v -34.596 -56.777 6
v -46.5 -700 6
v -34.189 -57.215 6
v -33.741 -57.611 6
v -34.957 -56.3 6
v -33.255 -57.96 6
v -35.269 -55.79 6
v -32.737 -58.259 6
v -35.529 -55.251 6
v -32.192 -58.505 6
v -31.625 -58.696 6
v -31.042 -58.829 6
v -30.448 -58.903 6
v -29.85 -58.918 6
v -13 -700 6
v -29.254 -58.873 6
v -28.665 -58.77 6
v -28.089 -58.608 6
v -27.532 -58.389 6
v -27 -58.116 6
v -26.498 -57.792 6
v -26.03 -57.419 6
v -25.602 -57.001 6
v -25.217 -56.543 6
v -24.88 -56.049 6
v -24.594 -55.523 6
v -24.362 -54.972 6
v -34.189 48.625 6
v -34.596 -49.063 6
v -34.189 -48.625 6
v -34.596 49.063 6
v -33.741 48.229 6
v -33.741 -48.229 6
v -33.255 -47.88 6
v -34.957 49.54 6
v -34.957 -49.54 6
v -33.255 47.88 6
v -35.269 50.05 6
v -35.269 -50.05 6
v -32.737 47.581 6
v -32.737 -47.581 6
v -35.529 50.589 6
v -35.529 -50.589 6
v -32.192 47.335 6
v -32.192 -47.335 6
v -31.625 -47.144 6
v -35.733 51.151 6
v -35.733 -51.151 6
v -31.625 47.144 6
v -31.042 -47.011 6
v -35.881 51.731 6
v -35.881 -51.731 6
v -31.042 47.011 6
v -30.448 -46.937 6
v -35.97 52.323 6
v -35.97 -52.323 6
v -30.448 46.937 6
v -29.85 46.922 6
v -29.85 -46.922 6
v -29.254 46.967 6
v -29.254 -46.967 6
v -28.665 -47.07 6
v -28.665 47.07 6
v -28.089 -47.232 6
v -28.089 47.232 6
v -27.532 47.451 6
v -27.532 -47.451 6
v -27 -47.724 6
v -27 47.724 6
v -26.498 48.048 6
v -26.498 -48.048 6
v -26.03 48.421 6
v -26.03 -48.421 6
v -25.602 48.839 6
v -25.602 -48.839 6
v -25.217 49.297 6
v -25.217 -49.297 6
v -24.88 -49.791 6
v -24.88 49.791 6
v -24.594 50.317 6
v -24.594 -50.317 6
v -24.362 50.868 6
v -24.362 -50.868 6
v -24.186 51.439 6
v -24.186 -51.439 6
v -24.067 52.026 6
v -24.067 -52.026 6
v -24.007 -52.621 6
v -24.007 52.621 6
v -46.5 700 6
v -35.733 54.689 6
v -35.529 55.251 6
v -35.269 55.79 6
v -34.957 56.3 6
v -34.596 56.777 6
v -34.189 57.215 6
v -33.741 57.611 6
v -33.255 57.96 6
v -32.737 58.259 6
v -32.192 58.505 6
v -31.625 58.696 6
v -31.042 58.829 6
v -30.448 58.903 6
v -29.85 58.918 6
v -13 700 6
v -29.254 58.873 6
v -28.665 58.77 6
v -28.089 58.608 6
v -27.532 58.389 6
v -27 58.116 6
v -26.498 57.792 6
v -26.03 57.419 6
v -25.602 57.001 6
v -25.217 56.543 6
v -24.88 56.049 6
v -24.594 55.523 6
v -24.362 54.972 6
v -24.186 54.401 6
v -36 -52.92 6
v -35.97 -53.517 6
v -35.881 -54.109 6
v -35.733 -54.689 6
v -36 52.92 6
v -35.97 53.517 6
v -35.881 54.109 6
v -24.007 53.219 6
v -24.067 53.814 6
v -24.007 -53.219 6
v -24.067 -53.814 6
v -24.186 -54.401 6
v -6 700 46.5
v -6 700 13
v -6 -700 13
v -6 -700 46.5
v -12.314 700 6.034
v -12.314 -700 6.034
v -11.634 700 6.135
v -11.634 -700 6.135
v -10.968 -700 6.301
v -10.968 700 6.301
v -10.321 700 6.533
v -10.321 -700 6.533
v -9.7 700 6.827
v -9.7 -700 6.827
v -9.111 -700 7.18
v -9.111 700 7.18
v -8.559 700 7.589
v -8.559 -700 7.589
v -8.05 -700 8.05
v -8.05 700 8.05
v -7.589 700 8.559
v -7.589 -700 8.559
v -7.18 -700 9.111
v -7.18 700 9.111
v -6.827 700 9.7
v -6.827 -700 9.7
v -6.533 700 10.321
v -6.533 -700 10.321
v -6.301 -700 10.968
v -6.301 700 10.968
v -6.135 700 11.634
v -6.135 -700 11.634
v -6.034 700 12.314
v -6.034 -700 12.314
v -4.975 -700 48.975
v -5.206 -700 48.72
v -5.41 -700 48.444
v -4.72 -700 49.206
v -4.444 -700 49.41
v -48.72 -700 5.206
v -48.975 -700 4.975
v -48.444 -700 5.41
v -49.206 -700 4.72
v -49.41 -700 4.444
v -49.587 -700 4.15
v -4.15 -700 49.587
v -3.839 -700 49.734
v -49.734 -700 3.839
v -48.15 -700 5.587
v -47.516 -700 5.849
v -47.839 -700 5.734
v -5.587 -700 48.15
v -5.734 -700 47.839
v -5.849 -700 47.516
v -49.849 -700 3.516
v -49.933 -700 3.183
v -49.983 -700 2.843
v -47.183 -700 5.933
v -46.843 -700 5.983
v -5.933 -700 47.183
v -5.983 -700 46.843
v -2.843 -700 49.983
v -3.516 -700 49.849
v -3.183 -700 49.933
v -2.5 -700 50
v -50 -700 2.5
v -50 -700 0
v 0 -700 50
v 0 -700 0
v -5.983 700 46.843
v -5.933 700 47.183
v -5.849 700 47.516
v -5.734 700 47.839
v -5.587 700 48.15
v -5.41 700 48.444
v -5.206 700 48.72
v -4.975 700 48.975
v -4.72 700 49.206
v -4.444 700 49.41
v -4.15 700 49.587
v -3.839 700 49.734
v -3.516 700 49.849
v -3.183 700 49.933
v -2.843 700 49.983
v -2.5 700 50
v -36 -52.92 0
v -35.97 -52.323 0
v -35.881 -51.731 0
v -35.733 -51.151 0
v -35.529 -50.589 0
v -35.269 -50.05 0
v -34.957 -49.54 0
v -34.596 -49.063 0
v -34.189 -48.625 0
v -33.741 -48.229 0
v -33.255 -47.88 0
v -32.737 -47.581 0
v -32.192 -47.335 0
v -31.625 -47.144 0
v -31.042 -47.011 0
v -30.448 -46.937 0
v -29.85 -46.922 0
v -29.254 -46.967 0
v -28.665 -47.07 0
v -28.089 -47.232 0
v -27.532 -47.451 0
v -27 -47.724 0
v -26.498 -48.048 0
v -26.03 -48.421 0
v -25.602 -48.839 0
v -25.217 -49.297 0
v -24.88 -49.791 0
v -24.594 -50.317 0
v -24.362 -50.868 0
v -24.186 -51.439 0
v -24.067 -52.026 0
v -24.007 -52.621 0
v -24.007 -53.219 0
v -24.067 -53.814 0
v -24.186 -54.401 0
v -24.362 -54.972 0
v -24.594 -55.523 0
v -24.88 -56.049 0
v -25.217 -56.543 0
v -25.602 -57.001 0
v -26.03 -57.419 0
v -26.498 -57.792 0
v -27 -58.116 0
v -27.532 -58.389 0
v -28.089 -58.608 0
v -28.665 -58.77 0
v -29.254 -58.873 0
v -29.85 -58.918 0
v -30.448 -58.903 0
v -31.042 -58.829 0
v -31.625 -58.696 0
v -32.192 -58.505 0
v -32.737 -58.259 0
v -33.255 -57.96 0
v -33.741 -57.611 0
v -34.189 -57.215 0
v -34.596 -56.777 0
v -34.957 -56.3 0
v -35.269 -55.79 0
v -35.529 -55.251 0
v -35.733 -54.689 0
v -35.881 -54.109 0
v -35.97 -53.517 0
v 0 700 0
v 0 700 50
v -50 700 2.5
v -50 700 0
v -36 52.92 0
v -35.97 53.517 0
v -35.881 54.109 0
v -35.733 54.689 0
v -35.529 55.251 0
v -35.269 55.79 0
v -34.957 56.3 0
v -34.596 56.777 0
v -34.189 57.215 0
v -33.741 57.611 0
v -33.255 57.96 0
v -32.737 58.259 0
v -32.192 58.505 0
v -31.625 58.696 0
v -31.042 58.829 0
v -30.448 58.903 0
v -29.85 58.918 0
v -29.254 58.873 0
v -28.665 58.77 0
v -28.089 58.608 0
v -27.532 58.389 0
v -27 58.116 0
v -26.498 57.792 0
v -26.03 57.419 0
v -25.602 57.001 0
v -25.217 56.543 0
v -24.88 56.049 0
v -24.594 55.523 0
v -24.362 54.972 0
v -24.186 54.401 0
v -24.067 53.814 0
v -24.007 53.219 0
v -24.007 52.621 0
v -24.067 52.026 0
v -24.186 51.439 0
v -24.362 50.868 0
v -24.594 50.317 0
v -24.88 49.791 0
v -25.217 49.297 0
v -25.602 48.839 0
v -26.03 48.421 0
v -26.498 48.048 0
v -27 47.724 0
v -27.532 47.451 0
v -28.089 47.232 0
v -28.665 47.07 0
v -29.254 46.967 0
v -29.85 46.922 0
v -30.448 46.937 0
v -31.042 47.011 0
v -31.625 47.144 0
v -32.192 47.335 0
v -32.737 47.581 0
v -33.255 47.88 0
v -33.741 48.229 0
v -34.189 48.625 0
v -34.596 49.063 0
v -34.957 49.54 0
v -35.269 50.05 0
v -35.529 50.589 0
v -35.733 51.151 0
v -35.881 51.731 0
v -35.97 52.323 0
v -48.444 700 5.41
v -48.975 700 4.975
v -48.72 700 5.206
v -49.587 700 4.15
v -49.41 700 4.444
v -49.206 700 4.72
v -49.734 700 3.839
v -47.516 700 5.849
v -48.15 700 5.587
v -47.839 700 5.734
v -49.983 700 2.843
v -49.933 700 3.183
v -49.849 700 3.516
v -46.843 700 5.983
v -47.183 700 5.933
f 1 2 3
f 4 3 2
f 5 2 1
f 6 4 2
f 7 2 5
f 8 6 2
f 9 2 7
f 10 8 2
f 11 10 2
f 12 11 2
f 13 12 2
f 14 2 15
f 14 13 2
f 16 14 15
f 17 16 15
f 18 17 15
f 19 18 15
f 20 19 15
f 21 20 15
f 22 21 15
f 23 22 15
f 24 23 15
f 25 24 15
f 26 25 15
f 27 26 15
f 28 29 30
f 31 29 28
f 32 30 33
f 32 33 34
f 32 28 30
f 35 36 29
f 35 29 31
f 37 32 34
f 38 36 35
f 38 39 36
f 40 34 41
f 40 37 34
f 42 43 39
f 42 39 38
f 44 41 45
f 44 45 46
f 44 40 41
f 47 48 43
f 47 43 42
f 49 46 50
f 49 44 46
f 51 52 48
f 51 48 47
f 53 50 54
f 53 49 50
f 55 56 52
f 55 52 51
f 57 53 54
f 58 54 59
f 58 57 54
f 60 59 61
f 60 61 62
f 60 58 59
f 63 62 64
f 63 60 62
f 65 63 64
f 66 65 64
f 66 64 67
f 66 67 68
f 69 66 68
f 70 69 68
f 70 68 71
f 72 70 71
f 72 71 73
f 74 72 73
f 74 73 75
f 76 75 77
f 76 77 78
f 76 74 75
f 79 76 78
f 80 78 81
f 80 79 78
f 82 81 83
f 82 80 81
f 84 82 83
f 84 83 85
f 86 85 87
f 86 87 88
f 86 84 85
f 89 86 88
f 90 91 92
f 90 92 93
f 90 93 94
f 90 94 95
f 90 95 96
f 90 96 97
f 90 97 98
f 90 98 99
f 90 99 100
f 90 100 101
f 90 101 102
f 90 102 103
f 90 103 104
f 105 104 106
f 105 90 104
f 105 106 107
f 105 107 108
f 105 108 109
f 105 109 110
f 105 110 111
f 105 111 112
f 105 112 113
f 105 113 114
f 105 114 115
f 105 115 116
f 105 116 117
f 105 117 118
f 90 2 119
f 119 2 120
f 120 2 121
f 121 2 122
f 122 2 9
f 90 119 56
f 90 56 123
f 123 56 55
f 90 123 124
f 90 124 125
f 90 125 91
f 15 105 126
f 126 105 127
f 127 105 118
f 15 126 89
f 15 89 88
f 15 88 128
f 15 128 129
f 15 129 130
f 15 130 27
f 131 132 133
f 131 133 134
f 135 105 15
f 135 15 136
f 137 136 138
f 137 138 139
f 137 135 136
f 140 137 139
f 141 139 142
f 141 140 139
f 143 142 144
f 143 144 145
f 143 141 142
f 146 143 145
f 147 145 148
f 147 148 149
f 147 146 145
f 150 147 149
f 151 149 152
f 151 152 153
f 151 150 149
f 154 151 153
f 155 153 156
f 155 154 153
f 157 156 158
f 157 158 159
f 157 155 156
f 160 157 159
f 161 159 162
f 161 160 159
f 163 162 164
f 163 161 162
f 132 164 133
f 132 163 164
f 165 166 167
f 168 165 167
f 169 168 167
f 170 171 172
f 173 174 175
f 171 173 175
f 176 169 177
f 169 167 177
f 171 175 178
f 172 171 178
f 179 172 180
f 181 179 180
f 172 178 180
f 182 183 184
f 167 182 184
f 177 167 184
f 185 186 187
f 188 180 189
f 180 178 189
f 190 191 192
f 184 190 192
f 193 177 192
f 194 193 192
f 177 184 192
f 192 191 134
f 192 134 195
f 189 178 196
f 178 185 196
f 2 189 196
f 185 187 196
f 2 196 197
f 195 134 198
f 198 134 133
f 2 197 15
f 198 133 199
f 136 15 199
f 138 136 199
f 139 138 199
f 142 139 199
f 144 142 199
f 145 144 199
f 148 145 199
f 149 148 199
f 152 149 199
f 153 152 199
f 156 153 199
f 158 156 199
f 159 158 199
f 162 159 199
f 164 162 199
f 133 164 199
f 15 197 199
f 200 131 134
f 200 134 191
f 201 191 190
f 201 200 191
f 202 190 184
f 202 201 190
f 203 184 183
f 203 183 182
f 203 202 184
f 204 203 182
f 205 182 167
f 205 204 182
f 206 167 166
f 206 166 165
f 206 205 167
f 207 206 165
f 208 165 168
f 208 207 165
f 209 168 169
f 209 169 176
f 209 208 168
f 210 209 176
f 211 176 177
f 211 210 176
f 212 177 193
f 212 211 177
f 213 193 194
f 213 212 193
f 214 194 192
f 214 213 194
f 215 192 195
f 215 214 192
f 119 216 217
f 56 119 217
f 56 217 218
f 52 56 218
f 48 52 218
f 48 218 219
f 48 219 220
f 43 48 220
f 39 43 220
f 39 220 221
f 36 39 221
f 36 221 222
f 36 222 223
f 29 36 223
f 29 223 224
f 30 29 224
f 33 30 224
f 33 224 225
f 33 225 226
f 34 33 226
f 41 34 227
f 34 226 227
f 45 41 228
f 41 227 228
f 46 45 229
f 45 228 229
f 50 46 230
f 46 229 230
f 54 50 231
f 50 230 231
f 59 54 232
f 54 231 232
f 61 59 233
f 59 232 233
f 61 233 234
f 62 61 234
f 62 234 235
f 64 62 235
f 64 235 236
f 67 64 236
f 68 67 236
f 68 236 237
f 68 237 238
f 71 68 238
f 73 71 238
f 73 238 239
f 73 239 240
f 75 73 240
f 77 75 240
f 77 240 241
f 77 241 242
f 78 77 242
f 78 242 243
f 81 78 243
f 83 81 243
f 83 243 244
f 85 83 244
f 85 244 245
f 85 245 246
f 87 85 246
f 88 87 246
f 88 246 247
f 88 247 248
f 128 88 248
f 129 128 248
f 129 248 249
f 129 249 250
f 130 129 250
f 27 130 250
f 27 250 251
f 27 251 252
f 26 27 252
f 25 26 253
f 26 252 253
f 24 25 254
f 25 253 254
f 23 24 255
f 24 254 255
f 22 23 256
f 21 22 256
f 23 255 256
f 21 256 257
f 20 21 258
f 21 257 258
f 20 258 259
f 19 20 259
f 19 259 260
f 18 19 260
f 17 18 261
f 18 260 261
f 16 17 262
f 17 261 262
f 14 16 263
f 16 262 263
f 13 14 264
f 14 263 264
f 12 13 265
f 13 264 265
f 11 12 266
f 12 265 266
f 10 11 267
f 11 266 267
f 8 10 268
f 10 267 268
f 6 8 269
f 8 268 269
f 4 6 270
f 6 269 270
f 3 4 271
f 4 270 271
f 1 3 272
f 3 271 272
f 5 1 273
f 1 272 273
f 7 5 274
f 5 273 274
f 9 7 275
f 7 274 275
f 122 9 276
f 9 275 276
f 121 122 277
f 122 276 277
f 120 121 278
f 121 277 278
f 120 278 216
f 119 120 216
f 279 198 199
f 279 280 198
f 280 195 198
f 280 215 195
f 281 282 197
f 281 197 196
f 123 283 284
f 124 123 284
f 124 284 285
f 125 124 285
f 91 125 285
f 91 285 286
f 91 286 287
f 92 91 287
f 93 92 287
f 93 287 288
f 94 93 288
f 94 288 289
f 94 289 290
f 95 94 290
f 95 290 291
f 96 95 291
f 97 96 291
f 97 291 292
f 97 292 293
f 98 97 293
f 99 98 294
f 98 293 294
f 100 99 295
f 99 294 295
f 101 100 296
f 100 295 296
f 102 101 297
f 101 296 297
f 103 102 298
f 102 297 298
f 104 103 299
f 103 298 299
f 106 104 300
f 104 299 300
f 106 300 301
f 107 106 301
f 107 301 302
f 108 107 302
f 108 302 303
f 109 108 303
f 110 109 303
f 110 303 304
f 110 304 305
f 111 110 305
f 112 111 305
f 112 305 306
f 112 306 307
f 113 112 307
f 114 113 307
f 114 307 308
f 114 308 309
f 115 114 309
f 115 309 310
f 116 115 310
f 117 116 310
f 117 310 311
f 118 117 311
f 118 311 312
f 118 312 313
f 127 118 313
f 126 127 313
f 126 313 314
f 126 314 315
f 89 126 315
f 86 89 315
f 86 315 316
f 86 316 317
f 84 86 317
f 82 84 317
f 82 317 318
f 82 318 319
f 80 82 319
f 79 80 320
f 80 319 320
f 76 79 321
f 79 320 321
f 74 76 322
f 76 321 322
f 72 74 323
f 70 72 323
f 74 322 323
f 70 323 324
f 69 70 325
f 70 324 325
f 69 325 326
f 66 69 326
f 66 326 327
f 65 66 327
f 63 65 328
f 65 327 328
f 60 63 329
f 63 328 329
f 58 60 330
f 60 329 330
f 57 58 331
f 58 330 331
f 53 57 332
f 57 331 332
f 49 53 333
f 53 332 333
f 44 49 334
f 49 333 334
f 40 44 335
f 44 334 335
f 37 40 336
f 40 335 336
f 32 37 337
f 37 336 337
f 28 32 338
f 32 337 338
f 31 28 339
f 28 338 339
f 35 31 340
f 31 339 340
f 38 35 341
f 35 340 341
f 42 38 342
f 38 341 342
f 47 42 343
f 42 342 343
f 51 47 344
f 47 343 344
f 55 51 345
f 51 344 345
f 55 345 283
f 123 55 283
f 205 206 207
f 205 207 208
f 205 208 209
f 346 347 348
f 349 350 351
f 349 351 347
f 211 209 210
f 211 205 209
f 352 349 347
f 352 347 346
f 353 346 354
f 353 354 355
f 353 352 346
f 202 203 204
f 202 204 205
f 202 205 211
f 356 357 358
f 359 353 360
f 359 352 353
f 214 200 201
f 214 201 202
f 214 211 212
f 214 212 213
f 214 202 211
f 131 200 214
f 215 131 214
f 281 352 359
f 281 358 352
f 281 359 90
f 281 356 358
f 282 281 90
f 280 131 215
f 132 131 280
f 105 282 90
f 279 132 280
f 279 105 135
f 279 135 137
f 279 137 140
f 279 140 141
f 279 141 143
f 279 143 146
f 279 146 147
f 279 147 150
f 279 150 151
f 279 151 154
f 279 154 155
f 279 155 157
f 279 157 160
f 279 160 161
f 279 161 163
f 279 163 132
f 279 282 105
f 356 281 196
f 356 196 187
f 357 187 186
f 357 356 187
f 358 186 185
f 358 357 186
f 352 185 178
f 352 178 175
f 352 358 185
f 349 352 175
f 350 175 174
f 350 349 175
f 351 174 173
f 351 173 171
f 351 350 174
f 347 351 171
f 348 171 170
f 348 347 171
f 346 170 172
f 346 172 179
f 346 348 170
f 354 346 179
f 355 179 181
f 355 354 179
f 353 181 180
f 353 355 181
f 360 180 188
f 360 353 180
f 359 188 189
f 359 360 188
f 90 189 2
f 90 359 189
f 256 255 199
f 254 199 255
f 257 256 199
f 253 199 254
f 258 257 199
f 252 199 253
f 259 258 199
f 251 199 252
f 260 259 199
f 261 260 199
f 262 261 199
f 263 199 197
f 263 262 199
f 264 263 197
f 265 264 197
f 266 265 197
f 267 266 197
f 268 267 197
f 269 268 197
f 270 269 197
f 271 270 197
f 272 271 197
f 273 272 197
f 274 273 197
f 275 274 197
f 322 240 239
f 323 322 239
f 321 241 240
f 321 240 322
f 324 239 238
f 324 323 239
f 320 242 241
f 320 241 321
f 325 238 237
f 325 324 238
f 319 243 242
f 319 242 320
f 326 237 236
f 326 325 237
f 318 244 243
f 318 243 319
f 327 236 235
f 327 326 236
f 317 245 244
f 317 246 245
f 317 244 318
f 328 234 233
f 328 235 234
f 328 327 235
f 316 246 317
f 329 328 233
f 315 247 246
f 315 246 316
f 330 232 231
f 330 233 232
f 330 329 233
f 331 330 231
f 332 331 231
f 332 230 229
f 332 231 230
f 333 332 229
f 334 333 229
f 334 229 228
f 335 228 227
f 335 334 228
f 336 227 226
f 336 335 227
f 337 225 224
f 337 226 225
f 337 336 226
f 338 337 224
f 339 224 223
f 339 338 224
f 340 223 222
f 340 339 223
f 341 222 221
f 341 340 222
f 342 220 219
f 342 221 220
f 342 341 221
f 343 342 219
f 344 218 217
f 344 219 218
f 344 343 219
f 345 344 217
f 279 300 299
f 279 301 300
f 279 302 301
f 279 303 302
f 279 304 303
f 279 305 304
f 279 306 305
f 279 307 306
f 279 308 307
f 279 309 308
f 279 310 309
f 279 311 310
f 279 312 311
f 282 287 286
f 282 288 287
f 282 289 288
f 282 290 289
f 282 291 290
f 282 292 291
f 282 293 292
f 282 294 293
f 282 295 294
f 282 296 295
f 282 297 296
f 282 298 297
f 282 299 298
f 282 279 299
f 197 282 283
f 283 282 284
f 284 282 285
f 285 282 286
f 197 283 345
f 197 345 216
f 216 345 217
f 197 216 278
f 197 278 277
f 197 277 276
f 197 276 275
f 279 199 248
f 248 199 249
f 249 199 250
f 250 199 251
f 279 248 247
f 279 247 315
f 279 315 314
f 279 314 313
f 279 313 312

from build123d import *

# Parameters (mm, degrees)
BOSS_EXTRUDE1_DEPTH = 700
CUT_EXTRUDE1_REACH  = 705.562
SKETCH2_R           = 6


with BuildPart() as part:
    # Sketch1 → Boss-Extrude1 (new, symmetric)
    with BuildSketch(Plane(origin=(0, 0, 0), x_dir=(1, 0, 0), z_dir=(0, 1, 0))):
        with BuildLine():
            Line((0, 0), (-50, 0))
            Line((-50, 0), (-50, -2.5))
            ThreePointArc((-50, -2.5), (-48.974873734, -4.974873734), (-46.5, -6))
            Line((-46.5, -6), (-13, -6))
            ThreePointArc((-13, -6), (-8.050252532, -8.050252532), (-6, -13))
            Line((-6, -13), (-6, -46.5))
            ThreePointArc((-6, -46.5), (-4.974873734, -48.974873734), (-2.5, -50))
            Line((-2.5, -50), (0, -50))
            Line((0, -50), (0, 0))
        make_face()
    extrude(amount=BOSS_EXTRUDE1_DEPTH, both=True)

    # Sketch2 → Cut-Extrude1 (cut, up to next)
    with BuildSketch(Plane(origin=(0, 0, 0), x_dir=(-1, 0, 0), z_dir=(0, 0, -1)), mode=Mode.PRIVATE) as cut_extrude1_sk1:
        with Locations((30, 52.92)):
            Circle(SKETCH2_R)
    cut_extrude1_tool1 = extrude(cut_extrude1_sk1.sketch, amount=-CUT_EXTRUDE1_REACH, mode=Mode.PRIVATE) & part.part
    # Sketch2 → Cut-Extrude1 (cut, up to next)
    with BuildSketch(Plane(origin=(0, 0, 0), x_dir=(-1, 0, 0), z_dir=(0, 0, -1)), mode=Mode.PRIVATE) as cut_extrude1_sk2:
        with Locations((30, -52.92)):
            Circle(SKETCH2_R)
    cut_extrude1_tool2 = extrude(cut_extrude1_sk2.sketch, amount=-CUT_EXTRUDE1_REACH, mode=Mode.PRIVATE) & part.part
    add(cut_extrude1_tool1.solids().sort_by_distance((-30, 52.92, 0))[0], mode=Mode.SUBTRACT)
    add(cut_extrude1_tool2.solids().sort_by_distance((-30, -52.92, 0))[0], mode=Mode.SUBTRACT)


solid = part.part
